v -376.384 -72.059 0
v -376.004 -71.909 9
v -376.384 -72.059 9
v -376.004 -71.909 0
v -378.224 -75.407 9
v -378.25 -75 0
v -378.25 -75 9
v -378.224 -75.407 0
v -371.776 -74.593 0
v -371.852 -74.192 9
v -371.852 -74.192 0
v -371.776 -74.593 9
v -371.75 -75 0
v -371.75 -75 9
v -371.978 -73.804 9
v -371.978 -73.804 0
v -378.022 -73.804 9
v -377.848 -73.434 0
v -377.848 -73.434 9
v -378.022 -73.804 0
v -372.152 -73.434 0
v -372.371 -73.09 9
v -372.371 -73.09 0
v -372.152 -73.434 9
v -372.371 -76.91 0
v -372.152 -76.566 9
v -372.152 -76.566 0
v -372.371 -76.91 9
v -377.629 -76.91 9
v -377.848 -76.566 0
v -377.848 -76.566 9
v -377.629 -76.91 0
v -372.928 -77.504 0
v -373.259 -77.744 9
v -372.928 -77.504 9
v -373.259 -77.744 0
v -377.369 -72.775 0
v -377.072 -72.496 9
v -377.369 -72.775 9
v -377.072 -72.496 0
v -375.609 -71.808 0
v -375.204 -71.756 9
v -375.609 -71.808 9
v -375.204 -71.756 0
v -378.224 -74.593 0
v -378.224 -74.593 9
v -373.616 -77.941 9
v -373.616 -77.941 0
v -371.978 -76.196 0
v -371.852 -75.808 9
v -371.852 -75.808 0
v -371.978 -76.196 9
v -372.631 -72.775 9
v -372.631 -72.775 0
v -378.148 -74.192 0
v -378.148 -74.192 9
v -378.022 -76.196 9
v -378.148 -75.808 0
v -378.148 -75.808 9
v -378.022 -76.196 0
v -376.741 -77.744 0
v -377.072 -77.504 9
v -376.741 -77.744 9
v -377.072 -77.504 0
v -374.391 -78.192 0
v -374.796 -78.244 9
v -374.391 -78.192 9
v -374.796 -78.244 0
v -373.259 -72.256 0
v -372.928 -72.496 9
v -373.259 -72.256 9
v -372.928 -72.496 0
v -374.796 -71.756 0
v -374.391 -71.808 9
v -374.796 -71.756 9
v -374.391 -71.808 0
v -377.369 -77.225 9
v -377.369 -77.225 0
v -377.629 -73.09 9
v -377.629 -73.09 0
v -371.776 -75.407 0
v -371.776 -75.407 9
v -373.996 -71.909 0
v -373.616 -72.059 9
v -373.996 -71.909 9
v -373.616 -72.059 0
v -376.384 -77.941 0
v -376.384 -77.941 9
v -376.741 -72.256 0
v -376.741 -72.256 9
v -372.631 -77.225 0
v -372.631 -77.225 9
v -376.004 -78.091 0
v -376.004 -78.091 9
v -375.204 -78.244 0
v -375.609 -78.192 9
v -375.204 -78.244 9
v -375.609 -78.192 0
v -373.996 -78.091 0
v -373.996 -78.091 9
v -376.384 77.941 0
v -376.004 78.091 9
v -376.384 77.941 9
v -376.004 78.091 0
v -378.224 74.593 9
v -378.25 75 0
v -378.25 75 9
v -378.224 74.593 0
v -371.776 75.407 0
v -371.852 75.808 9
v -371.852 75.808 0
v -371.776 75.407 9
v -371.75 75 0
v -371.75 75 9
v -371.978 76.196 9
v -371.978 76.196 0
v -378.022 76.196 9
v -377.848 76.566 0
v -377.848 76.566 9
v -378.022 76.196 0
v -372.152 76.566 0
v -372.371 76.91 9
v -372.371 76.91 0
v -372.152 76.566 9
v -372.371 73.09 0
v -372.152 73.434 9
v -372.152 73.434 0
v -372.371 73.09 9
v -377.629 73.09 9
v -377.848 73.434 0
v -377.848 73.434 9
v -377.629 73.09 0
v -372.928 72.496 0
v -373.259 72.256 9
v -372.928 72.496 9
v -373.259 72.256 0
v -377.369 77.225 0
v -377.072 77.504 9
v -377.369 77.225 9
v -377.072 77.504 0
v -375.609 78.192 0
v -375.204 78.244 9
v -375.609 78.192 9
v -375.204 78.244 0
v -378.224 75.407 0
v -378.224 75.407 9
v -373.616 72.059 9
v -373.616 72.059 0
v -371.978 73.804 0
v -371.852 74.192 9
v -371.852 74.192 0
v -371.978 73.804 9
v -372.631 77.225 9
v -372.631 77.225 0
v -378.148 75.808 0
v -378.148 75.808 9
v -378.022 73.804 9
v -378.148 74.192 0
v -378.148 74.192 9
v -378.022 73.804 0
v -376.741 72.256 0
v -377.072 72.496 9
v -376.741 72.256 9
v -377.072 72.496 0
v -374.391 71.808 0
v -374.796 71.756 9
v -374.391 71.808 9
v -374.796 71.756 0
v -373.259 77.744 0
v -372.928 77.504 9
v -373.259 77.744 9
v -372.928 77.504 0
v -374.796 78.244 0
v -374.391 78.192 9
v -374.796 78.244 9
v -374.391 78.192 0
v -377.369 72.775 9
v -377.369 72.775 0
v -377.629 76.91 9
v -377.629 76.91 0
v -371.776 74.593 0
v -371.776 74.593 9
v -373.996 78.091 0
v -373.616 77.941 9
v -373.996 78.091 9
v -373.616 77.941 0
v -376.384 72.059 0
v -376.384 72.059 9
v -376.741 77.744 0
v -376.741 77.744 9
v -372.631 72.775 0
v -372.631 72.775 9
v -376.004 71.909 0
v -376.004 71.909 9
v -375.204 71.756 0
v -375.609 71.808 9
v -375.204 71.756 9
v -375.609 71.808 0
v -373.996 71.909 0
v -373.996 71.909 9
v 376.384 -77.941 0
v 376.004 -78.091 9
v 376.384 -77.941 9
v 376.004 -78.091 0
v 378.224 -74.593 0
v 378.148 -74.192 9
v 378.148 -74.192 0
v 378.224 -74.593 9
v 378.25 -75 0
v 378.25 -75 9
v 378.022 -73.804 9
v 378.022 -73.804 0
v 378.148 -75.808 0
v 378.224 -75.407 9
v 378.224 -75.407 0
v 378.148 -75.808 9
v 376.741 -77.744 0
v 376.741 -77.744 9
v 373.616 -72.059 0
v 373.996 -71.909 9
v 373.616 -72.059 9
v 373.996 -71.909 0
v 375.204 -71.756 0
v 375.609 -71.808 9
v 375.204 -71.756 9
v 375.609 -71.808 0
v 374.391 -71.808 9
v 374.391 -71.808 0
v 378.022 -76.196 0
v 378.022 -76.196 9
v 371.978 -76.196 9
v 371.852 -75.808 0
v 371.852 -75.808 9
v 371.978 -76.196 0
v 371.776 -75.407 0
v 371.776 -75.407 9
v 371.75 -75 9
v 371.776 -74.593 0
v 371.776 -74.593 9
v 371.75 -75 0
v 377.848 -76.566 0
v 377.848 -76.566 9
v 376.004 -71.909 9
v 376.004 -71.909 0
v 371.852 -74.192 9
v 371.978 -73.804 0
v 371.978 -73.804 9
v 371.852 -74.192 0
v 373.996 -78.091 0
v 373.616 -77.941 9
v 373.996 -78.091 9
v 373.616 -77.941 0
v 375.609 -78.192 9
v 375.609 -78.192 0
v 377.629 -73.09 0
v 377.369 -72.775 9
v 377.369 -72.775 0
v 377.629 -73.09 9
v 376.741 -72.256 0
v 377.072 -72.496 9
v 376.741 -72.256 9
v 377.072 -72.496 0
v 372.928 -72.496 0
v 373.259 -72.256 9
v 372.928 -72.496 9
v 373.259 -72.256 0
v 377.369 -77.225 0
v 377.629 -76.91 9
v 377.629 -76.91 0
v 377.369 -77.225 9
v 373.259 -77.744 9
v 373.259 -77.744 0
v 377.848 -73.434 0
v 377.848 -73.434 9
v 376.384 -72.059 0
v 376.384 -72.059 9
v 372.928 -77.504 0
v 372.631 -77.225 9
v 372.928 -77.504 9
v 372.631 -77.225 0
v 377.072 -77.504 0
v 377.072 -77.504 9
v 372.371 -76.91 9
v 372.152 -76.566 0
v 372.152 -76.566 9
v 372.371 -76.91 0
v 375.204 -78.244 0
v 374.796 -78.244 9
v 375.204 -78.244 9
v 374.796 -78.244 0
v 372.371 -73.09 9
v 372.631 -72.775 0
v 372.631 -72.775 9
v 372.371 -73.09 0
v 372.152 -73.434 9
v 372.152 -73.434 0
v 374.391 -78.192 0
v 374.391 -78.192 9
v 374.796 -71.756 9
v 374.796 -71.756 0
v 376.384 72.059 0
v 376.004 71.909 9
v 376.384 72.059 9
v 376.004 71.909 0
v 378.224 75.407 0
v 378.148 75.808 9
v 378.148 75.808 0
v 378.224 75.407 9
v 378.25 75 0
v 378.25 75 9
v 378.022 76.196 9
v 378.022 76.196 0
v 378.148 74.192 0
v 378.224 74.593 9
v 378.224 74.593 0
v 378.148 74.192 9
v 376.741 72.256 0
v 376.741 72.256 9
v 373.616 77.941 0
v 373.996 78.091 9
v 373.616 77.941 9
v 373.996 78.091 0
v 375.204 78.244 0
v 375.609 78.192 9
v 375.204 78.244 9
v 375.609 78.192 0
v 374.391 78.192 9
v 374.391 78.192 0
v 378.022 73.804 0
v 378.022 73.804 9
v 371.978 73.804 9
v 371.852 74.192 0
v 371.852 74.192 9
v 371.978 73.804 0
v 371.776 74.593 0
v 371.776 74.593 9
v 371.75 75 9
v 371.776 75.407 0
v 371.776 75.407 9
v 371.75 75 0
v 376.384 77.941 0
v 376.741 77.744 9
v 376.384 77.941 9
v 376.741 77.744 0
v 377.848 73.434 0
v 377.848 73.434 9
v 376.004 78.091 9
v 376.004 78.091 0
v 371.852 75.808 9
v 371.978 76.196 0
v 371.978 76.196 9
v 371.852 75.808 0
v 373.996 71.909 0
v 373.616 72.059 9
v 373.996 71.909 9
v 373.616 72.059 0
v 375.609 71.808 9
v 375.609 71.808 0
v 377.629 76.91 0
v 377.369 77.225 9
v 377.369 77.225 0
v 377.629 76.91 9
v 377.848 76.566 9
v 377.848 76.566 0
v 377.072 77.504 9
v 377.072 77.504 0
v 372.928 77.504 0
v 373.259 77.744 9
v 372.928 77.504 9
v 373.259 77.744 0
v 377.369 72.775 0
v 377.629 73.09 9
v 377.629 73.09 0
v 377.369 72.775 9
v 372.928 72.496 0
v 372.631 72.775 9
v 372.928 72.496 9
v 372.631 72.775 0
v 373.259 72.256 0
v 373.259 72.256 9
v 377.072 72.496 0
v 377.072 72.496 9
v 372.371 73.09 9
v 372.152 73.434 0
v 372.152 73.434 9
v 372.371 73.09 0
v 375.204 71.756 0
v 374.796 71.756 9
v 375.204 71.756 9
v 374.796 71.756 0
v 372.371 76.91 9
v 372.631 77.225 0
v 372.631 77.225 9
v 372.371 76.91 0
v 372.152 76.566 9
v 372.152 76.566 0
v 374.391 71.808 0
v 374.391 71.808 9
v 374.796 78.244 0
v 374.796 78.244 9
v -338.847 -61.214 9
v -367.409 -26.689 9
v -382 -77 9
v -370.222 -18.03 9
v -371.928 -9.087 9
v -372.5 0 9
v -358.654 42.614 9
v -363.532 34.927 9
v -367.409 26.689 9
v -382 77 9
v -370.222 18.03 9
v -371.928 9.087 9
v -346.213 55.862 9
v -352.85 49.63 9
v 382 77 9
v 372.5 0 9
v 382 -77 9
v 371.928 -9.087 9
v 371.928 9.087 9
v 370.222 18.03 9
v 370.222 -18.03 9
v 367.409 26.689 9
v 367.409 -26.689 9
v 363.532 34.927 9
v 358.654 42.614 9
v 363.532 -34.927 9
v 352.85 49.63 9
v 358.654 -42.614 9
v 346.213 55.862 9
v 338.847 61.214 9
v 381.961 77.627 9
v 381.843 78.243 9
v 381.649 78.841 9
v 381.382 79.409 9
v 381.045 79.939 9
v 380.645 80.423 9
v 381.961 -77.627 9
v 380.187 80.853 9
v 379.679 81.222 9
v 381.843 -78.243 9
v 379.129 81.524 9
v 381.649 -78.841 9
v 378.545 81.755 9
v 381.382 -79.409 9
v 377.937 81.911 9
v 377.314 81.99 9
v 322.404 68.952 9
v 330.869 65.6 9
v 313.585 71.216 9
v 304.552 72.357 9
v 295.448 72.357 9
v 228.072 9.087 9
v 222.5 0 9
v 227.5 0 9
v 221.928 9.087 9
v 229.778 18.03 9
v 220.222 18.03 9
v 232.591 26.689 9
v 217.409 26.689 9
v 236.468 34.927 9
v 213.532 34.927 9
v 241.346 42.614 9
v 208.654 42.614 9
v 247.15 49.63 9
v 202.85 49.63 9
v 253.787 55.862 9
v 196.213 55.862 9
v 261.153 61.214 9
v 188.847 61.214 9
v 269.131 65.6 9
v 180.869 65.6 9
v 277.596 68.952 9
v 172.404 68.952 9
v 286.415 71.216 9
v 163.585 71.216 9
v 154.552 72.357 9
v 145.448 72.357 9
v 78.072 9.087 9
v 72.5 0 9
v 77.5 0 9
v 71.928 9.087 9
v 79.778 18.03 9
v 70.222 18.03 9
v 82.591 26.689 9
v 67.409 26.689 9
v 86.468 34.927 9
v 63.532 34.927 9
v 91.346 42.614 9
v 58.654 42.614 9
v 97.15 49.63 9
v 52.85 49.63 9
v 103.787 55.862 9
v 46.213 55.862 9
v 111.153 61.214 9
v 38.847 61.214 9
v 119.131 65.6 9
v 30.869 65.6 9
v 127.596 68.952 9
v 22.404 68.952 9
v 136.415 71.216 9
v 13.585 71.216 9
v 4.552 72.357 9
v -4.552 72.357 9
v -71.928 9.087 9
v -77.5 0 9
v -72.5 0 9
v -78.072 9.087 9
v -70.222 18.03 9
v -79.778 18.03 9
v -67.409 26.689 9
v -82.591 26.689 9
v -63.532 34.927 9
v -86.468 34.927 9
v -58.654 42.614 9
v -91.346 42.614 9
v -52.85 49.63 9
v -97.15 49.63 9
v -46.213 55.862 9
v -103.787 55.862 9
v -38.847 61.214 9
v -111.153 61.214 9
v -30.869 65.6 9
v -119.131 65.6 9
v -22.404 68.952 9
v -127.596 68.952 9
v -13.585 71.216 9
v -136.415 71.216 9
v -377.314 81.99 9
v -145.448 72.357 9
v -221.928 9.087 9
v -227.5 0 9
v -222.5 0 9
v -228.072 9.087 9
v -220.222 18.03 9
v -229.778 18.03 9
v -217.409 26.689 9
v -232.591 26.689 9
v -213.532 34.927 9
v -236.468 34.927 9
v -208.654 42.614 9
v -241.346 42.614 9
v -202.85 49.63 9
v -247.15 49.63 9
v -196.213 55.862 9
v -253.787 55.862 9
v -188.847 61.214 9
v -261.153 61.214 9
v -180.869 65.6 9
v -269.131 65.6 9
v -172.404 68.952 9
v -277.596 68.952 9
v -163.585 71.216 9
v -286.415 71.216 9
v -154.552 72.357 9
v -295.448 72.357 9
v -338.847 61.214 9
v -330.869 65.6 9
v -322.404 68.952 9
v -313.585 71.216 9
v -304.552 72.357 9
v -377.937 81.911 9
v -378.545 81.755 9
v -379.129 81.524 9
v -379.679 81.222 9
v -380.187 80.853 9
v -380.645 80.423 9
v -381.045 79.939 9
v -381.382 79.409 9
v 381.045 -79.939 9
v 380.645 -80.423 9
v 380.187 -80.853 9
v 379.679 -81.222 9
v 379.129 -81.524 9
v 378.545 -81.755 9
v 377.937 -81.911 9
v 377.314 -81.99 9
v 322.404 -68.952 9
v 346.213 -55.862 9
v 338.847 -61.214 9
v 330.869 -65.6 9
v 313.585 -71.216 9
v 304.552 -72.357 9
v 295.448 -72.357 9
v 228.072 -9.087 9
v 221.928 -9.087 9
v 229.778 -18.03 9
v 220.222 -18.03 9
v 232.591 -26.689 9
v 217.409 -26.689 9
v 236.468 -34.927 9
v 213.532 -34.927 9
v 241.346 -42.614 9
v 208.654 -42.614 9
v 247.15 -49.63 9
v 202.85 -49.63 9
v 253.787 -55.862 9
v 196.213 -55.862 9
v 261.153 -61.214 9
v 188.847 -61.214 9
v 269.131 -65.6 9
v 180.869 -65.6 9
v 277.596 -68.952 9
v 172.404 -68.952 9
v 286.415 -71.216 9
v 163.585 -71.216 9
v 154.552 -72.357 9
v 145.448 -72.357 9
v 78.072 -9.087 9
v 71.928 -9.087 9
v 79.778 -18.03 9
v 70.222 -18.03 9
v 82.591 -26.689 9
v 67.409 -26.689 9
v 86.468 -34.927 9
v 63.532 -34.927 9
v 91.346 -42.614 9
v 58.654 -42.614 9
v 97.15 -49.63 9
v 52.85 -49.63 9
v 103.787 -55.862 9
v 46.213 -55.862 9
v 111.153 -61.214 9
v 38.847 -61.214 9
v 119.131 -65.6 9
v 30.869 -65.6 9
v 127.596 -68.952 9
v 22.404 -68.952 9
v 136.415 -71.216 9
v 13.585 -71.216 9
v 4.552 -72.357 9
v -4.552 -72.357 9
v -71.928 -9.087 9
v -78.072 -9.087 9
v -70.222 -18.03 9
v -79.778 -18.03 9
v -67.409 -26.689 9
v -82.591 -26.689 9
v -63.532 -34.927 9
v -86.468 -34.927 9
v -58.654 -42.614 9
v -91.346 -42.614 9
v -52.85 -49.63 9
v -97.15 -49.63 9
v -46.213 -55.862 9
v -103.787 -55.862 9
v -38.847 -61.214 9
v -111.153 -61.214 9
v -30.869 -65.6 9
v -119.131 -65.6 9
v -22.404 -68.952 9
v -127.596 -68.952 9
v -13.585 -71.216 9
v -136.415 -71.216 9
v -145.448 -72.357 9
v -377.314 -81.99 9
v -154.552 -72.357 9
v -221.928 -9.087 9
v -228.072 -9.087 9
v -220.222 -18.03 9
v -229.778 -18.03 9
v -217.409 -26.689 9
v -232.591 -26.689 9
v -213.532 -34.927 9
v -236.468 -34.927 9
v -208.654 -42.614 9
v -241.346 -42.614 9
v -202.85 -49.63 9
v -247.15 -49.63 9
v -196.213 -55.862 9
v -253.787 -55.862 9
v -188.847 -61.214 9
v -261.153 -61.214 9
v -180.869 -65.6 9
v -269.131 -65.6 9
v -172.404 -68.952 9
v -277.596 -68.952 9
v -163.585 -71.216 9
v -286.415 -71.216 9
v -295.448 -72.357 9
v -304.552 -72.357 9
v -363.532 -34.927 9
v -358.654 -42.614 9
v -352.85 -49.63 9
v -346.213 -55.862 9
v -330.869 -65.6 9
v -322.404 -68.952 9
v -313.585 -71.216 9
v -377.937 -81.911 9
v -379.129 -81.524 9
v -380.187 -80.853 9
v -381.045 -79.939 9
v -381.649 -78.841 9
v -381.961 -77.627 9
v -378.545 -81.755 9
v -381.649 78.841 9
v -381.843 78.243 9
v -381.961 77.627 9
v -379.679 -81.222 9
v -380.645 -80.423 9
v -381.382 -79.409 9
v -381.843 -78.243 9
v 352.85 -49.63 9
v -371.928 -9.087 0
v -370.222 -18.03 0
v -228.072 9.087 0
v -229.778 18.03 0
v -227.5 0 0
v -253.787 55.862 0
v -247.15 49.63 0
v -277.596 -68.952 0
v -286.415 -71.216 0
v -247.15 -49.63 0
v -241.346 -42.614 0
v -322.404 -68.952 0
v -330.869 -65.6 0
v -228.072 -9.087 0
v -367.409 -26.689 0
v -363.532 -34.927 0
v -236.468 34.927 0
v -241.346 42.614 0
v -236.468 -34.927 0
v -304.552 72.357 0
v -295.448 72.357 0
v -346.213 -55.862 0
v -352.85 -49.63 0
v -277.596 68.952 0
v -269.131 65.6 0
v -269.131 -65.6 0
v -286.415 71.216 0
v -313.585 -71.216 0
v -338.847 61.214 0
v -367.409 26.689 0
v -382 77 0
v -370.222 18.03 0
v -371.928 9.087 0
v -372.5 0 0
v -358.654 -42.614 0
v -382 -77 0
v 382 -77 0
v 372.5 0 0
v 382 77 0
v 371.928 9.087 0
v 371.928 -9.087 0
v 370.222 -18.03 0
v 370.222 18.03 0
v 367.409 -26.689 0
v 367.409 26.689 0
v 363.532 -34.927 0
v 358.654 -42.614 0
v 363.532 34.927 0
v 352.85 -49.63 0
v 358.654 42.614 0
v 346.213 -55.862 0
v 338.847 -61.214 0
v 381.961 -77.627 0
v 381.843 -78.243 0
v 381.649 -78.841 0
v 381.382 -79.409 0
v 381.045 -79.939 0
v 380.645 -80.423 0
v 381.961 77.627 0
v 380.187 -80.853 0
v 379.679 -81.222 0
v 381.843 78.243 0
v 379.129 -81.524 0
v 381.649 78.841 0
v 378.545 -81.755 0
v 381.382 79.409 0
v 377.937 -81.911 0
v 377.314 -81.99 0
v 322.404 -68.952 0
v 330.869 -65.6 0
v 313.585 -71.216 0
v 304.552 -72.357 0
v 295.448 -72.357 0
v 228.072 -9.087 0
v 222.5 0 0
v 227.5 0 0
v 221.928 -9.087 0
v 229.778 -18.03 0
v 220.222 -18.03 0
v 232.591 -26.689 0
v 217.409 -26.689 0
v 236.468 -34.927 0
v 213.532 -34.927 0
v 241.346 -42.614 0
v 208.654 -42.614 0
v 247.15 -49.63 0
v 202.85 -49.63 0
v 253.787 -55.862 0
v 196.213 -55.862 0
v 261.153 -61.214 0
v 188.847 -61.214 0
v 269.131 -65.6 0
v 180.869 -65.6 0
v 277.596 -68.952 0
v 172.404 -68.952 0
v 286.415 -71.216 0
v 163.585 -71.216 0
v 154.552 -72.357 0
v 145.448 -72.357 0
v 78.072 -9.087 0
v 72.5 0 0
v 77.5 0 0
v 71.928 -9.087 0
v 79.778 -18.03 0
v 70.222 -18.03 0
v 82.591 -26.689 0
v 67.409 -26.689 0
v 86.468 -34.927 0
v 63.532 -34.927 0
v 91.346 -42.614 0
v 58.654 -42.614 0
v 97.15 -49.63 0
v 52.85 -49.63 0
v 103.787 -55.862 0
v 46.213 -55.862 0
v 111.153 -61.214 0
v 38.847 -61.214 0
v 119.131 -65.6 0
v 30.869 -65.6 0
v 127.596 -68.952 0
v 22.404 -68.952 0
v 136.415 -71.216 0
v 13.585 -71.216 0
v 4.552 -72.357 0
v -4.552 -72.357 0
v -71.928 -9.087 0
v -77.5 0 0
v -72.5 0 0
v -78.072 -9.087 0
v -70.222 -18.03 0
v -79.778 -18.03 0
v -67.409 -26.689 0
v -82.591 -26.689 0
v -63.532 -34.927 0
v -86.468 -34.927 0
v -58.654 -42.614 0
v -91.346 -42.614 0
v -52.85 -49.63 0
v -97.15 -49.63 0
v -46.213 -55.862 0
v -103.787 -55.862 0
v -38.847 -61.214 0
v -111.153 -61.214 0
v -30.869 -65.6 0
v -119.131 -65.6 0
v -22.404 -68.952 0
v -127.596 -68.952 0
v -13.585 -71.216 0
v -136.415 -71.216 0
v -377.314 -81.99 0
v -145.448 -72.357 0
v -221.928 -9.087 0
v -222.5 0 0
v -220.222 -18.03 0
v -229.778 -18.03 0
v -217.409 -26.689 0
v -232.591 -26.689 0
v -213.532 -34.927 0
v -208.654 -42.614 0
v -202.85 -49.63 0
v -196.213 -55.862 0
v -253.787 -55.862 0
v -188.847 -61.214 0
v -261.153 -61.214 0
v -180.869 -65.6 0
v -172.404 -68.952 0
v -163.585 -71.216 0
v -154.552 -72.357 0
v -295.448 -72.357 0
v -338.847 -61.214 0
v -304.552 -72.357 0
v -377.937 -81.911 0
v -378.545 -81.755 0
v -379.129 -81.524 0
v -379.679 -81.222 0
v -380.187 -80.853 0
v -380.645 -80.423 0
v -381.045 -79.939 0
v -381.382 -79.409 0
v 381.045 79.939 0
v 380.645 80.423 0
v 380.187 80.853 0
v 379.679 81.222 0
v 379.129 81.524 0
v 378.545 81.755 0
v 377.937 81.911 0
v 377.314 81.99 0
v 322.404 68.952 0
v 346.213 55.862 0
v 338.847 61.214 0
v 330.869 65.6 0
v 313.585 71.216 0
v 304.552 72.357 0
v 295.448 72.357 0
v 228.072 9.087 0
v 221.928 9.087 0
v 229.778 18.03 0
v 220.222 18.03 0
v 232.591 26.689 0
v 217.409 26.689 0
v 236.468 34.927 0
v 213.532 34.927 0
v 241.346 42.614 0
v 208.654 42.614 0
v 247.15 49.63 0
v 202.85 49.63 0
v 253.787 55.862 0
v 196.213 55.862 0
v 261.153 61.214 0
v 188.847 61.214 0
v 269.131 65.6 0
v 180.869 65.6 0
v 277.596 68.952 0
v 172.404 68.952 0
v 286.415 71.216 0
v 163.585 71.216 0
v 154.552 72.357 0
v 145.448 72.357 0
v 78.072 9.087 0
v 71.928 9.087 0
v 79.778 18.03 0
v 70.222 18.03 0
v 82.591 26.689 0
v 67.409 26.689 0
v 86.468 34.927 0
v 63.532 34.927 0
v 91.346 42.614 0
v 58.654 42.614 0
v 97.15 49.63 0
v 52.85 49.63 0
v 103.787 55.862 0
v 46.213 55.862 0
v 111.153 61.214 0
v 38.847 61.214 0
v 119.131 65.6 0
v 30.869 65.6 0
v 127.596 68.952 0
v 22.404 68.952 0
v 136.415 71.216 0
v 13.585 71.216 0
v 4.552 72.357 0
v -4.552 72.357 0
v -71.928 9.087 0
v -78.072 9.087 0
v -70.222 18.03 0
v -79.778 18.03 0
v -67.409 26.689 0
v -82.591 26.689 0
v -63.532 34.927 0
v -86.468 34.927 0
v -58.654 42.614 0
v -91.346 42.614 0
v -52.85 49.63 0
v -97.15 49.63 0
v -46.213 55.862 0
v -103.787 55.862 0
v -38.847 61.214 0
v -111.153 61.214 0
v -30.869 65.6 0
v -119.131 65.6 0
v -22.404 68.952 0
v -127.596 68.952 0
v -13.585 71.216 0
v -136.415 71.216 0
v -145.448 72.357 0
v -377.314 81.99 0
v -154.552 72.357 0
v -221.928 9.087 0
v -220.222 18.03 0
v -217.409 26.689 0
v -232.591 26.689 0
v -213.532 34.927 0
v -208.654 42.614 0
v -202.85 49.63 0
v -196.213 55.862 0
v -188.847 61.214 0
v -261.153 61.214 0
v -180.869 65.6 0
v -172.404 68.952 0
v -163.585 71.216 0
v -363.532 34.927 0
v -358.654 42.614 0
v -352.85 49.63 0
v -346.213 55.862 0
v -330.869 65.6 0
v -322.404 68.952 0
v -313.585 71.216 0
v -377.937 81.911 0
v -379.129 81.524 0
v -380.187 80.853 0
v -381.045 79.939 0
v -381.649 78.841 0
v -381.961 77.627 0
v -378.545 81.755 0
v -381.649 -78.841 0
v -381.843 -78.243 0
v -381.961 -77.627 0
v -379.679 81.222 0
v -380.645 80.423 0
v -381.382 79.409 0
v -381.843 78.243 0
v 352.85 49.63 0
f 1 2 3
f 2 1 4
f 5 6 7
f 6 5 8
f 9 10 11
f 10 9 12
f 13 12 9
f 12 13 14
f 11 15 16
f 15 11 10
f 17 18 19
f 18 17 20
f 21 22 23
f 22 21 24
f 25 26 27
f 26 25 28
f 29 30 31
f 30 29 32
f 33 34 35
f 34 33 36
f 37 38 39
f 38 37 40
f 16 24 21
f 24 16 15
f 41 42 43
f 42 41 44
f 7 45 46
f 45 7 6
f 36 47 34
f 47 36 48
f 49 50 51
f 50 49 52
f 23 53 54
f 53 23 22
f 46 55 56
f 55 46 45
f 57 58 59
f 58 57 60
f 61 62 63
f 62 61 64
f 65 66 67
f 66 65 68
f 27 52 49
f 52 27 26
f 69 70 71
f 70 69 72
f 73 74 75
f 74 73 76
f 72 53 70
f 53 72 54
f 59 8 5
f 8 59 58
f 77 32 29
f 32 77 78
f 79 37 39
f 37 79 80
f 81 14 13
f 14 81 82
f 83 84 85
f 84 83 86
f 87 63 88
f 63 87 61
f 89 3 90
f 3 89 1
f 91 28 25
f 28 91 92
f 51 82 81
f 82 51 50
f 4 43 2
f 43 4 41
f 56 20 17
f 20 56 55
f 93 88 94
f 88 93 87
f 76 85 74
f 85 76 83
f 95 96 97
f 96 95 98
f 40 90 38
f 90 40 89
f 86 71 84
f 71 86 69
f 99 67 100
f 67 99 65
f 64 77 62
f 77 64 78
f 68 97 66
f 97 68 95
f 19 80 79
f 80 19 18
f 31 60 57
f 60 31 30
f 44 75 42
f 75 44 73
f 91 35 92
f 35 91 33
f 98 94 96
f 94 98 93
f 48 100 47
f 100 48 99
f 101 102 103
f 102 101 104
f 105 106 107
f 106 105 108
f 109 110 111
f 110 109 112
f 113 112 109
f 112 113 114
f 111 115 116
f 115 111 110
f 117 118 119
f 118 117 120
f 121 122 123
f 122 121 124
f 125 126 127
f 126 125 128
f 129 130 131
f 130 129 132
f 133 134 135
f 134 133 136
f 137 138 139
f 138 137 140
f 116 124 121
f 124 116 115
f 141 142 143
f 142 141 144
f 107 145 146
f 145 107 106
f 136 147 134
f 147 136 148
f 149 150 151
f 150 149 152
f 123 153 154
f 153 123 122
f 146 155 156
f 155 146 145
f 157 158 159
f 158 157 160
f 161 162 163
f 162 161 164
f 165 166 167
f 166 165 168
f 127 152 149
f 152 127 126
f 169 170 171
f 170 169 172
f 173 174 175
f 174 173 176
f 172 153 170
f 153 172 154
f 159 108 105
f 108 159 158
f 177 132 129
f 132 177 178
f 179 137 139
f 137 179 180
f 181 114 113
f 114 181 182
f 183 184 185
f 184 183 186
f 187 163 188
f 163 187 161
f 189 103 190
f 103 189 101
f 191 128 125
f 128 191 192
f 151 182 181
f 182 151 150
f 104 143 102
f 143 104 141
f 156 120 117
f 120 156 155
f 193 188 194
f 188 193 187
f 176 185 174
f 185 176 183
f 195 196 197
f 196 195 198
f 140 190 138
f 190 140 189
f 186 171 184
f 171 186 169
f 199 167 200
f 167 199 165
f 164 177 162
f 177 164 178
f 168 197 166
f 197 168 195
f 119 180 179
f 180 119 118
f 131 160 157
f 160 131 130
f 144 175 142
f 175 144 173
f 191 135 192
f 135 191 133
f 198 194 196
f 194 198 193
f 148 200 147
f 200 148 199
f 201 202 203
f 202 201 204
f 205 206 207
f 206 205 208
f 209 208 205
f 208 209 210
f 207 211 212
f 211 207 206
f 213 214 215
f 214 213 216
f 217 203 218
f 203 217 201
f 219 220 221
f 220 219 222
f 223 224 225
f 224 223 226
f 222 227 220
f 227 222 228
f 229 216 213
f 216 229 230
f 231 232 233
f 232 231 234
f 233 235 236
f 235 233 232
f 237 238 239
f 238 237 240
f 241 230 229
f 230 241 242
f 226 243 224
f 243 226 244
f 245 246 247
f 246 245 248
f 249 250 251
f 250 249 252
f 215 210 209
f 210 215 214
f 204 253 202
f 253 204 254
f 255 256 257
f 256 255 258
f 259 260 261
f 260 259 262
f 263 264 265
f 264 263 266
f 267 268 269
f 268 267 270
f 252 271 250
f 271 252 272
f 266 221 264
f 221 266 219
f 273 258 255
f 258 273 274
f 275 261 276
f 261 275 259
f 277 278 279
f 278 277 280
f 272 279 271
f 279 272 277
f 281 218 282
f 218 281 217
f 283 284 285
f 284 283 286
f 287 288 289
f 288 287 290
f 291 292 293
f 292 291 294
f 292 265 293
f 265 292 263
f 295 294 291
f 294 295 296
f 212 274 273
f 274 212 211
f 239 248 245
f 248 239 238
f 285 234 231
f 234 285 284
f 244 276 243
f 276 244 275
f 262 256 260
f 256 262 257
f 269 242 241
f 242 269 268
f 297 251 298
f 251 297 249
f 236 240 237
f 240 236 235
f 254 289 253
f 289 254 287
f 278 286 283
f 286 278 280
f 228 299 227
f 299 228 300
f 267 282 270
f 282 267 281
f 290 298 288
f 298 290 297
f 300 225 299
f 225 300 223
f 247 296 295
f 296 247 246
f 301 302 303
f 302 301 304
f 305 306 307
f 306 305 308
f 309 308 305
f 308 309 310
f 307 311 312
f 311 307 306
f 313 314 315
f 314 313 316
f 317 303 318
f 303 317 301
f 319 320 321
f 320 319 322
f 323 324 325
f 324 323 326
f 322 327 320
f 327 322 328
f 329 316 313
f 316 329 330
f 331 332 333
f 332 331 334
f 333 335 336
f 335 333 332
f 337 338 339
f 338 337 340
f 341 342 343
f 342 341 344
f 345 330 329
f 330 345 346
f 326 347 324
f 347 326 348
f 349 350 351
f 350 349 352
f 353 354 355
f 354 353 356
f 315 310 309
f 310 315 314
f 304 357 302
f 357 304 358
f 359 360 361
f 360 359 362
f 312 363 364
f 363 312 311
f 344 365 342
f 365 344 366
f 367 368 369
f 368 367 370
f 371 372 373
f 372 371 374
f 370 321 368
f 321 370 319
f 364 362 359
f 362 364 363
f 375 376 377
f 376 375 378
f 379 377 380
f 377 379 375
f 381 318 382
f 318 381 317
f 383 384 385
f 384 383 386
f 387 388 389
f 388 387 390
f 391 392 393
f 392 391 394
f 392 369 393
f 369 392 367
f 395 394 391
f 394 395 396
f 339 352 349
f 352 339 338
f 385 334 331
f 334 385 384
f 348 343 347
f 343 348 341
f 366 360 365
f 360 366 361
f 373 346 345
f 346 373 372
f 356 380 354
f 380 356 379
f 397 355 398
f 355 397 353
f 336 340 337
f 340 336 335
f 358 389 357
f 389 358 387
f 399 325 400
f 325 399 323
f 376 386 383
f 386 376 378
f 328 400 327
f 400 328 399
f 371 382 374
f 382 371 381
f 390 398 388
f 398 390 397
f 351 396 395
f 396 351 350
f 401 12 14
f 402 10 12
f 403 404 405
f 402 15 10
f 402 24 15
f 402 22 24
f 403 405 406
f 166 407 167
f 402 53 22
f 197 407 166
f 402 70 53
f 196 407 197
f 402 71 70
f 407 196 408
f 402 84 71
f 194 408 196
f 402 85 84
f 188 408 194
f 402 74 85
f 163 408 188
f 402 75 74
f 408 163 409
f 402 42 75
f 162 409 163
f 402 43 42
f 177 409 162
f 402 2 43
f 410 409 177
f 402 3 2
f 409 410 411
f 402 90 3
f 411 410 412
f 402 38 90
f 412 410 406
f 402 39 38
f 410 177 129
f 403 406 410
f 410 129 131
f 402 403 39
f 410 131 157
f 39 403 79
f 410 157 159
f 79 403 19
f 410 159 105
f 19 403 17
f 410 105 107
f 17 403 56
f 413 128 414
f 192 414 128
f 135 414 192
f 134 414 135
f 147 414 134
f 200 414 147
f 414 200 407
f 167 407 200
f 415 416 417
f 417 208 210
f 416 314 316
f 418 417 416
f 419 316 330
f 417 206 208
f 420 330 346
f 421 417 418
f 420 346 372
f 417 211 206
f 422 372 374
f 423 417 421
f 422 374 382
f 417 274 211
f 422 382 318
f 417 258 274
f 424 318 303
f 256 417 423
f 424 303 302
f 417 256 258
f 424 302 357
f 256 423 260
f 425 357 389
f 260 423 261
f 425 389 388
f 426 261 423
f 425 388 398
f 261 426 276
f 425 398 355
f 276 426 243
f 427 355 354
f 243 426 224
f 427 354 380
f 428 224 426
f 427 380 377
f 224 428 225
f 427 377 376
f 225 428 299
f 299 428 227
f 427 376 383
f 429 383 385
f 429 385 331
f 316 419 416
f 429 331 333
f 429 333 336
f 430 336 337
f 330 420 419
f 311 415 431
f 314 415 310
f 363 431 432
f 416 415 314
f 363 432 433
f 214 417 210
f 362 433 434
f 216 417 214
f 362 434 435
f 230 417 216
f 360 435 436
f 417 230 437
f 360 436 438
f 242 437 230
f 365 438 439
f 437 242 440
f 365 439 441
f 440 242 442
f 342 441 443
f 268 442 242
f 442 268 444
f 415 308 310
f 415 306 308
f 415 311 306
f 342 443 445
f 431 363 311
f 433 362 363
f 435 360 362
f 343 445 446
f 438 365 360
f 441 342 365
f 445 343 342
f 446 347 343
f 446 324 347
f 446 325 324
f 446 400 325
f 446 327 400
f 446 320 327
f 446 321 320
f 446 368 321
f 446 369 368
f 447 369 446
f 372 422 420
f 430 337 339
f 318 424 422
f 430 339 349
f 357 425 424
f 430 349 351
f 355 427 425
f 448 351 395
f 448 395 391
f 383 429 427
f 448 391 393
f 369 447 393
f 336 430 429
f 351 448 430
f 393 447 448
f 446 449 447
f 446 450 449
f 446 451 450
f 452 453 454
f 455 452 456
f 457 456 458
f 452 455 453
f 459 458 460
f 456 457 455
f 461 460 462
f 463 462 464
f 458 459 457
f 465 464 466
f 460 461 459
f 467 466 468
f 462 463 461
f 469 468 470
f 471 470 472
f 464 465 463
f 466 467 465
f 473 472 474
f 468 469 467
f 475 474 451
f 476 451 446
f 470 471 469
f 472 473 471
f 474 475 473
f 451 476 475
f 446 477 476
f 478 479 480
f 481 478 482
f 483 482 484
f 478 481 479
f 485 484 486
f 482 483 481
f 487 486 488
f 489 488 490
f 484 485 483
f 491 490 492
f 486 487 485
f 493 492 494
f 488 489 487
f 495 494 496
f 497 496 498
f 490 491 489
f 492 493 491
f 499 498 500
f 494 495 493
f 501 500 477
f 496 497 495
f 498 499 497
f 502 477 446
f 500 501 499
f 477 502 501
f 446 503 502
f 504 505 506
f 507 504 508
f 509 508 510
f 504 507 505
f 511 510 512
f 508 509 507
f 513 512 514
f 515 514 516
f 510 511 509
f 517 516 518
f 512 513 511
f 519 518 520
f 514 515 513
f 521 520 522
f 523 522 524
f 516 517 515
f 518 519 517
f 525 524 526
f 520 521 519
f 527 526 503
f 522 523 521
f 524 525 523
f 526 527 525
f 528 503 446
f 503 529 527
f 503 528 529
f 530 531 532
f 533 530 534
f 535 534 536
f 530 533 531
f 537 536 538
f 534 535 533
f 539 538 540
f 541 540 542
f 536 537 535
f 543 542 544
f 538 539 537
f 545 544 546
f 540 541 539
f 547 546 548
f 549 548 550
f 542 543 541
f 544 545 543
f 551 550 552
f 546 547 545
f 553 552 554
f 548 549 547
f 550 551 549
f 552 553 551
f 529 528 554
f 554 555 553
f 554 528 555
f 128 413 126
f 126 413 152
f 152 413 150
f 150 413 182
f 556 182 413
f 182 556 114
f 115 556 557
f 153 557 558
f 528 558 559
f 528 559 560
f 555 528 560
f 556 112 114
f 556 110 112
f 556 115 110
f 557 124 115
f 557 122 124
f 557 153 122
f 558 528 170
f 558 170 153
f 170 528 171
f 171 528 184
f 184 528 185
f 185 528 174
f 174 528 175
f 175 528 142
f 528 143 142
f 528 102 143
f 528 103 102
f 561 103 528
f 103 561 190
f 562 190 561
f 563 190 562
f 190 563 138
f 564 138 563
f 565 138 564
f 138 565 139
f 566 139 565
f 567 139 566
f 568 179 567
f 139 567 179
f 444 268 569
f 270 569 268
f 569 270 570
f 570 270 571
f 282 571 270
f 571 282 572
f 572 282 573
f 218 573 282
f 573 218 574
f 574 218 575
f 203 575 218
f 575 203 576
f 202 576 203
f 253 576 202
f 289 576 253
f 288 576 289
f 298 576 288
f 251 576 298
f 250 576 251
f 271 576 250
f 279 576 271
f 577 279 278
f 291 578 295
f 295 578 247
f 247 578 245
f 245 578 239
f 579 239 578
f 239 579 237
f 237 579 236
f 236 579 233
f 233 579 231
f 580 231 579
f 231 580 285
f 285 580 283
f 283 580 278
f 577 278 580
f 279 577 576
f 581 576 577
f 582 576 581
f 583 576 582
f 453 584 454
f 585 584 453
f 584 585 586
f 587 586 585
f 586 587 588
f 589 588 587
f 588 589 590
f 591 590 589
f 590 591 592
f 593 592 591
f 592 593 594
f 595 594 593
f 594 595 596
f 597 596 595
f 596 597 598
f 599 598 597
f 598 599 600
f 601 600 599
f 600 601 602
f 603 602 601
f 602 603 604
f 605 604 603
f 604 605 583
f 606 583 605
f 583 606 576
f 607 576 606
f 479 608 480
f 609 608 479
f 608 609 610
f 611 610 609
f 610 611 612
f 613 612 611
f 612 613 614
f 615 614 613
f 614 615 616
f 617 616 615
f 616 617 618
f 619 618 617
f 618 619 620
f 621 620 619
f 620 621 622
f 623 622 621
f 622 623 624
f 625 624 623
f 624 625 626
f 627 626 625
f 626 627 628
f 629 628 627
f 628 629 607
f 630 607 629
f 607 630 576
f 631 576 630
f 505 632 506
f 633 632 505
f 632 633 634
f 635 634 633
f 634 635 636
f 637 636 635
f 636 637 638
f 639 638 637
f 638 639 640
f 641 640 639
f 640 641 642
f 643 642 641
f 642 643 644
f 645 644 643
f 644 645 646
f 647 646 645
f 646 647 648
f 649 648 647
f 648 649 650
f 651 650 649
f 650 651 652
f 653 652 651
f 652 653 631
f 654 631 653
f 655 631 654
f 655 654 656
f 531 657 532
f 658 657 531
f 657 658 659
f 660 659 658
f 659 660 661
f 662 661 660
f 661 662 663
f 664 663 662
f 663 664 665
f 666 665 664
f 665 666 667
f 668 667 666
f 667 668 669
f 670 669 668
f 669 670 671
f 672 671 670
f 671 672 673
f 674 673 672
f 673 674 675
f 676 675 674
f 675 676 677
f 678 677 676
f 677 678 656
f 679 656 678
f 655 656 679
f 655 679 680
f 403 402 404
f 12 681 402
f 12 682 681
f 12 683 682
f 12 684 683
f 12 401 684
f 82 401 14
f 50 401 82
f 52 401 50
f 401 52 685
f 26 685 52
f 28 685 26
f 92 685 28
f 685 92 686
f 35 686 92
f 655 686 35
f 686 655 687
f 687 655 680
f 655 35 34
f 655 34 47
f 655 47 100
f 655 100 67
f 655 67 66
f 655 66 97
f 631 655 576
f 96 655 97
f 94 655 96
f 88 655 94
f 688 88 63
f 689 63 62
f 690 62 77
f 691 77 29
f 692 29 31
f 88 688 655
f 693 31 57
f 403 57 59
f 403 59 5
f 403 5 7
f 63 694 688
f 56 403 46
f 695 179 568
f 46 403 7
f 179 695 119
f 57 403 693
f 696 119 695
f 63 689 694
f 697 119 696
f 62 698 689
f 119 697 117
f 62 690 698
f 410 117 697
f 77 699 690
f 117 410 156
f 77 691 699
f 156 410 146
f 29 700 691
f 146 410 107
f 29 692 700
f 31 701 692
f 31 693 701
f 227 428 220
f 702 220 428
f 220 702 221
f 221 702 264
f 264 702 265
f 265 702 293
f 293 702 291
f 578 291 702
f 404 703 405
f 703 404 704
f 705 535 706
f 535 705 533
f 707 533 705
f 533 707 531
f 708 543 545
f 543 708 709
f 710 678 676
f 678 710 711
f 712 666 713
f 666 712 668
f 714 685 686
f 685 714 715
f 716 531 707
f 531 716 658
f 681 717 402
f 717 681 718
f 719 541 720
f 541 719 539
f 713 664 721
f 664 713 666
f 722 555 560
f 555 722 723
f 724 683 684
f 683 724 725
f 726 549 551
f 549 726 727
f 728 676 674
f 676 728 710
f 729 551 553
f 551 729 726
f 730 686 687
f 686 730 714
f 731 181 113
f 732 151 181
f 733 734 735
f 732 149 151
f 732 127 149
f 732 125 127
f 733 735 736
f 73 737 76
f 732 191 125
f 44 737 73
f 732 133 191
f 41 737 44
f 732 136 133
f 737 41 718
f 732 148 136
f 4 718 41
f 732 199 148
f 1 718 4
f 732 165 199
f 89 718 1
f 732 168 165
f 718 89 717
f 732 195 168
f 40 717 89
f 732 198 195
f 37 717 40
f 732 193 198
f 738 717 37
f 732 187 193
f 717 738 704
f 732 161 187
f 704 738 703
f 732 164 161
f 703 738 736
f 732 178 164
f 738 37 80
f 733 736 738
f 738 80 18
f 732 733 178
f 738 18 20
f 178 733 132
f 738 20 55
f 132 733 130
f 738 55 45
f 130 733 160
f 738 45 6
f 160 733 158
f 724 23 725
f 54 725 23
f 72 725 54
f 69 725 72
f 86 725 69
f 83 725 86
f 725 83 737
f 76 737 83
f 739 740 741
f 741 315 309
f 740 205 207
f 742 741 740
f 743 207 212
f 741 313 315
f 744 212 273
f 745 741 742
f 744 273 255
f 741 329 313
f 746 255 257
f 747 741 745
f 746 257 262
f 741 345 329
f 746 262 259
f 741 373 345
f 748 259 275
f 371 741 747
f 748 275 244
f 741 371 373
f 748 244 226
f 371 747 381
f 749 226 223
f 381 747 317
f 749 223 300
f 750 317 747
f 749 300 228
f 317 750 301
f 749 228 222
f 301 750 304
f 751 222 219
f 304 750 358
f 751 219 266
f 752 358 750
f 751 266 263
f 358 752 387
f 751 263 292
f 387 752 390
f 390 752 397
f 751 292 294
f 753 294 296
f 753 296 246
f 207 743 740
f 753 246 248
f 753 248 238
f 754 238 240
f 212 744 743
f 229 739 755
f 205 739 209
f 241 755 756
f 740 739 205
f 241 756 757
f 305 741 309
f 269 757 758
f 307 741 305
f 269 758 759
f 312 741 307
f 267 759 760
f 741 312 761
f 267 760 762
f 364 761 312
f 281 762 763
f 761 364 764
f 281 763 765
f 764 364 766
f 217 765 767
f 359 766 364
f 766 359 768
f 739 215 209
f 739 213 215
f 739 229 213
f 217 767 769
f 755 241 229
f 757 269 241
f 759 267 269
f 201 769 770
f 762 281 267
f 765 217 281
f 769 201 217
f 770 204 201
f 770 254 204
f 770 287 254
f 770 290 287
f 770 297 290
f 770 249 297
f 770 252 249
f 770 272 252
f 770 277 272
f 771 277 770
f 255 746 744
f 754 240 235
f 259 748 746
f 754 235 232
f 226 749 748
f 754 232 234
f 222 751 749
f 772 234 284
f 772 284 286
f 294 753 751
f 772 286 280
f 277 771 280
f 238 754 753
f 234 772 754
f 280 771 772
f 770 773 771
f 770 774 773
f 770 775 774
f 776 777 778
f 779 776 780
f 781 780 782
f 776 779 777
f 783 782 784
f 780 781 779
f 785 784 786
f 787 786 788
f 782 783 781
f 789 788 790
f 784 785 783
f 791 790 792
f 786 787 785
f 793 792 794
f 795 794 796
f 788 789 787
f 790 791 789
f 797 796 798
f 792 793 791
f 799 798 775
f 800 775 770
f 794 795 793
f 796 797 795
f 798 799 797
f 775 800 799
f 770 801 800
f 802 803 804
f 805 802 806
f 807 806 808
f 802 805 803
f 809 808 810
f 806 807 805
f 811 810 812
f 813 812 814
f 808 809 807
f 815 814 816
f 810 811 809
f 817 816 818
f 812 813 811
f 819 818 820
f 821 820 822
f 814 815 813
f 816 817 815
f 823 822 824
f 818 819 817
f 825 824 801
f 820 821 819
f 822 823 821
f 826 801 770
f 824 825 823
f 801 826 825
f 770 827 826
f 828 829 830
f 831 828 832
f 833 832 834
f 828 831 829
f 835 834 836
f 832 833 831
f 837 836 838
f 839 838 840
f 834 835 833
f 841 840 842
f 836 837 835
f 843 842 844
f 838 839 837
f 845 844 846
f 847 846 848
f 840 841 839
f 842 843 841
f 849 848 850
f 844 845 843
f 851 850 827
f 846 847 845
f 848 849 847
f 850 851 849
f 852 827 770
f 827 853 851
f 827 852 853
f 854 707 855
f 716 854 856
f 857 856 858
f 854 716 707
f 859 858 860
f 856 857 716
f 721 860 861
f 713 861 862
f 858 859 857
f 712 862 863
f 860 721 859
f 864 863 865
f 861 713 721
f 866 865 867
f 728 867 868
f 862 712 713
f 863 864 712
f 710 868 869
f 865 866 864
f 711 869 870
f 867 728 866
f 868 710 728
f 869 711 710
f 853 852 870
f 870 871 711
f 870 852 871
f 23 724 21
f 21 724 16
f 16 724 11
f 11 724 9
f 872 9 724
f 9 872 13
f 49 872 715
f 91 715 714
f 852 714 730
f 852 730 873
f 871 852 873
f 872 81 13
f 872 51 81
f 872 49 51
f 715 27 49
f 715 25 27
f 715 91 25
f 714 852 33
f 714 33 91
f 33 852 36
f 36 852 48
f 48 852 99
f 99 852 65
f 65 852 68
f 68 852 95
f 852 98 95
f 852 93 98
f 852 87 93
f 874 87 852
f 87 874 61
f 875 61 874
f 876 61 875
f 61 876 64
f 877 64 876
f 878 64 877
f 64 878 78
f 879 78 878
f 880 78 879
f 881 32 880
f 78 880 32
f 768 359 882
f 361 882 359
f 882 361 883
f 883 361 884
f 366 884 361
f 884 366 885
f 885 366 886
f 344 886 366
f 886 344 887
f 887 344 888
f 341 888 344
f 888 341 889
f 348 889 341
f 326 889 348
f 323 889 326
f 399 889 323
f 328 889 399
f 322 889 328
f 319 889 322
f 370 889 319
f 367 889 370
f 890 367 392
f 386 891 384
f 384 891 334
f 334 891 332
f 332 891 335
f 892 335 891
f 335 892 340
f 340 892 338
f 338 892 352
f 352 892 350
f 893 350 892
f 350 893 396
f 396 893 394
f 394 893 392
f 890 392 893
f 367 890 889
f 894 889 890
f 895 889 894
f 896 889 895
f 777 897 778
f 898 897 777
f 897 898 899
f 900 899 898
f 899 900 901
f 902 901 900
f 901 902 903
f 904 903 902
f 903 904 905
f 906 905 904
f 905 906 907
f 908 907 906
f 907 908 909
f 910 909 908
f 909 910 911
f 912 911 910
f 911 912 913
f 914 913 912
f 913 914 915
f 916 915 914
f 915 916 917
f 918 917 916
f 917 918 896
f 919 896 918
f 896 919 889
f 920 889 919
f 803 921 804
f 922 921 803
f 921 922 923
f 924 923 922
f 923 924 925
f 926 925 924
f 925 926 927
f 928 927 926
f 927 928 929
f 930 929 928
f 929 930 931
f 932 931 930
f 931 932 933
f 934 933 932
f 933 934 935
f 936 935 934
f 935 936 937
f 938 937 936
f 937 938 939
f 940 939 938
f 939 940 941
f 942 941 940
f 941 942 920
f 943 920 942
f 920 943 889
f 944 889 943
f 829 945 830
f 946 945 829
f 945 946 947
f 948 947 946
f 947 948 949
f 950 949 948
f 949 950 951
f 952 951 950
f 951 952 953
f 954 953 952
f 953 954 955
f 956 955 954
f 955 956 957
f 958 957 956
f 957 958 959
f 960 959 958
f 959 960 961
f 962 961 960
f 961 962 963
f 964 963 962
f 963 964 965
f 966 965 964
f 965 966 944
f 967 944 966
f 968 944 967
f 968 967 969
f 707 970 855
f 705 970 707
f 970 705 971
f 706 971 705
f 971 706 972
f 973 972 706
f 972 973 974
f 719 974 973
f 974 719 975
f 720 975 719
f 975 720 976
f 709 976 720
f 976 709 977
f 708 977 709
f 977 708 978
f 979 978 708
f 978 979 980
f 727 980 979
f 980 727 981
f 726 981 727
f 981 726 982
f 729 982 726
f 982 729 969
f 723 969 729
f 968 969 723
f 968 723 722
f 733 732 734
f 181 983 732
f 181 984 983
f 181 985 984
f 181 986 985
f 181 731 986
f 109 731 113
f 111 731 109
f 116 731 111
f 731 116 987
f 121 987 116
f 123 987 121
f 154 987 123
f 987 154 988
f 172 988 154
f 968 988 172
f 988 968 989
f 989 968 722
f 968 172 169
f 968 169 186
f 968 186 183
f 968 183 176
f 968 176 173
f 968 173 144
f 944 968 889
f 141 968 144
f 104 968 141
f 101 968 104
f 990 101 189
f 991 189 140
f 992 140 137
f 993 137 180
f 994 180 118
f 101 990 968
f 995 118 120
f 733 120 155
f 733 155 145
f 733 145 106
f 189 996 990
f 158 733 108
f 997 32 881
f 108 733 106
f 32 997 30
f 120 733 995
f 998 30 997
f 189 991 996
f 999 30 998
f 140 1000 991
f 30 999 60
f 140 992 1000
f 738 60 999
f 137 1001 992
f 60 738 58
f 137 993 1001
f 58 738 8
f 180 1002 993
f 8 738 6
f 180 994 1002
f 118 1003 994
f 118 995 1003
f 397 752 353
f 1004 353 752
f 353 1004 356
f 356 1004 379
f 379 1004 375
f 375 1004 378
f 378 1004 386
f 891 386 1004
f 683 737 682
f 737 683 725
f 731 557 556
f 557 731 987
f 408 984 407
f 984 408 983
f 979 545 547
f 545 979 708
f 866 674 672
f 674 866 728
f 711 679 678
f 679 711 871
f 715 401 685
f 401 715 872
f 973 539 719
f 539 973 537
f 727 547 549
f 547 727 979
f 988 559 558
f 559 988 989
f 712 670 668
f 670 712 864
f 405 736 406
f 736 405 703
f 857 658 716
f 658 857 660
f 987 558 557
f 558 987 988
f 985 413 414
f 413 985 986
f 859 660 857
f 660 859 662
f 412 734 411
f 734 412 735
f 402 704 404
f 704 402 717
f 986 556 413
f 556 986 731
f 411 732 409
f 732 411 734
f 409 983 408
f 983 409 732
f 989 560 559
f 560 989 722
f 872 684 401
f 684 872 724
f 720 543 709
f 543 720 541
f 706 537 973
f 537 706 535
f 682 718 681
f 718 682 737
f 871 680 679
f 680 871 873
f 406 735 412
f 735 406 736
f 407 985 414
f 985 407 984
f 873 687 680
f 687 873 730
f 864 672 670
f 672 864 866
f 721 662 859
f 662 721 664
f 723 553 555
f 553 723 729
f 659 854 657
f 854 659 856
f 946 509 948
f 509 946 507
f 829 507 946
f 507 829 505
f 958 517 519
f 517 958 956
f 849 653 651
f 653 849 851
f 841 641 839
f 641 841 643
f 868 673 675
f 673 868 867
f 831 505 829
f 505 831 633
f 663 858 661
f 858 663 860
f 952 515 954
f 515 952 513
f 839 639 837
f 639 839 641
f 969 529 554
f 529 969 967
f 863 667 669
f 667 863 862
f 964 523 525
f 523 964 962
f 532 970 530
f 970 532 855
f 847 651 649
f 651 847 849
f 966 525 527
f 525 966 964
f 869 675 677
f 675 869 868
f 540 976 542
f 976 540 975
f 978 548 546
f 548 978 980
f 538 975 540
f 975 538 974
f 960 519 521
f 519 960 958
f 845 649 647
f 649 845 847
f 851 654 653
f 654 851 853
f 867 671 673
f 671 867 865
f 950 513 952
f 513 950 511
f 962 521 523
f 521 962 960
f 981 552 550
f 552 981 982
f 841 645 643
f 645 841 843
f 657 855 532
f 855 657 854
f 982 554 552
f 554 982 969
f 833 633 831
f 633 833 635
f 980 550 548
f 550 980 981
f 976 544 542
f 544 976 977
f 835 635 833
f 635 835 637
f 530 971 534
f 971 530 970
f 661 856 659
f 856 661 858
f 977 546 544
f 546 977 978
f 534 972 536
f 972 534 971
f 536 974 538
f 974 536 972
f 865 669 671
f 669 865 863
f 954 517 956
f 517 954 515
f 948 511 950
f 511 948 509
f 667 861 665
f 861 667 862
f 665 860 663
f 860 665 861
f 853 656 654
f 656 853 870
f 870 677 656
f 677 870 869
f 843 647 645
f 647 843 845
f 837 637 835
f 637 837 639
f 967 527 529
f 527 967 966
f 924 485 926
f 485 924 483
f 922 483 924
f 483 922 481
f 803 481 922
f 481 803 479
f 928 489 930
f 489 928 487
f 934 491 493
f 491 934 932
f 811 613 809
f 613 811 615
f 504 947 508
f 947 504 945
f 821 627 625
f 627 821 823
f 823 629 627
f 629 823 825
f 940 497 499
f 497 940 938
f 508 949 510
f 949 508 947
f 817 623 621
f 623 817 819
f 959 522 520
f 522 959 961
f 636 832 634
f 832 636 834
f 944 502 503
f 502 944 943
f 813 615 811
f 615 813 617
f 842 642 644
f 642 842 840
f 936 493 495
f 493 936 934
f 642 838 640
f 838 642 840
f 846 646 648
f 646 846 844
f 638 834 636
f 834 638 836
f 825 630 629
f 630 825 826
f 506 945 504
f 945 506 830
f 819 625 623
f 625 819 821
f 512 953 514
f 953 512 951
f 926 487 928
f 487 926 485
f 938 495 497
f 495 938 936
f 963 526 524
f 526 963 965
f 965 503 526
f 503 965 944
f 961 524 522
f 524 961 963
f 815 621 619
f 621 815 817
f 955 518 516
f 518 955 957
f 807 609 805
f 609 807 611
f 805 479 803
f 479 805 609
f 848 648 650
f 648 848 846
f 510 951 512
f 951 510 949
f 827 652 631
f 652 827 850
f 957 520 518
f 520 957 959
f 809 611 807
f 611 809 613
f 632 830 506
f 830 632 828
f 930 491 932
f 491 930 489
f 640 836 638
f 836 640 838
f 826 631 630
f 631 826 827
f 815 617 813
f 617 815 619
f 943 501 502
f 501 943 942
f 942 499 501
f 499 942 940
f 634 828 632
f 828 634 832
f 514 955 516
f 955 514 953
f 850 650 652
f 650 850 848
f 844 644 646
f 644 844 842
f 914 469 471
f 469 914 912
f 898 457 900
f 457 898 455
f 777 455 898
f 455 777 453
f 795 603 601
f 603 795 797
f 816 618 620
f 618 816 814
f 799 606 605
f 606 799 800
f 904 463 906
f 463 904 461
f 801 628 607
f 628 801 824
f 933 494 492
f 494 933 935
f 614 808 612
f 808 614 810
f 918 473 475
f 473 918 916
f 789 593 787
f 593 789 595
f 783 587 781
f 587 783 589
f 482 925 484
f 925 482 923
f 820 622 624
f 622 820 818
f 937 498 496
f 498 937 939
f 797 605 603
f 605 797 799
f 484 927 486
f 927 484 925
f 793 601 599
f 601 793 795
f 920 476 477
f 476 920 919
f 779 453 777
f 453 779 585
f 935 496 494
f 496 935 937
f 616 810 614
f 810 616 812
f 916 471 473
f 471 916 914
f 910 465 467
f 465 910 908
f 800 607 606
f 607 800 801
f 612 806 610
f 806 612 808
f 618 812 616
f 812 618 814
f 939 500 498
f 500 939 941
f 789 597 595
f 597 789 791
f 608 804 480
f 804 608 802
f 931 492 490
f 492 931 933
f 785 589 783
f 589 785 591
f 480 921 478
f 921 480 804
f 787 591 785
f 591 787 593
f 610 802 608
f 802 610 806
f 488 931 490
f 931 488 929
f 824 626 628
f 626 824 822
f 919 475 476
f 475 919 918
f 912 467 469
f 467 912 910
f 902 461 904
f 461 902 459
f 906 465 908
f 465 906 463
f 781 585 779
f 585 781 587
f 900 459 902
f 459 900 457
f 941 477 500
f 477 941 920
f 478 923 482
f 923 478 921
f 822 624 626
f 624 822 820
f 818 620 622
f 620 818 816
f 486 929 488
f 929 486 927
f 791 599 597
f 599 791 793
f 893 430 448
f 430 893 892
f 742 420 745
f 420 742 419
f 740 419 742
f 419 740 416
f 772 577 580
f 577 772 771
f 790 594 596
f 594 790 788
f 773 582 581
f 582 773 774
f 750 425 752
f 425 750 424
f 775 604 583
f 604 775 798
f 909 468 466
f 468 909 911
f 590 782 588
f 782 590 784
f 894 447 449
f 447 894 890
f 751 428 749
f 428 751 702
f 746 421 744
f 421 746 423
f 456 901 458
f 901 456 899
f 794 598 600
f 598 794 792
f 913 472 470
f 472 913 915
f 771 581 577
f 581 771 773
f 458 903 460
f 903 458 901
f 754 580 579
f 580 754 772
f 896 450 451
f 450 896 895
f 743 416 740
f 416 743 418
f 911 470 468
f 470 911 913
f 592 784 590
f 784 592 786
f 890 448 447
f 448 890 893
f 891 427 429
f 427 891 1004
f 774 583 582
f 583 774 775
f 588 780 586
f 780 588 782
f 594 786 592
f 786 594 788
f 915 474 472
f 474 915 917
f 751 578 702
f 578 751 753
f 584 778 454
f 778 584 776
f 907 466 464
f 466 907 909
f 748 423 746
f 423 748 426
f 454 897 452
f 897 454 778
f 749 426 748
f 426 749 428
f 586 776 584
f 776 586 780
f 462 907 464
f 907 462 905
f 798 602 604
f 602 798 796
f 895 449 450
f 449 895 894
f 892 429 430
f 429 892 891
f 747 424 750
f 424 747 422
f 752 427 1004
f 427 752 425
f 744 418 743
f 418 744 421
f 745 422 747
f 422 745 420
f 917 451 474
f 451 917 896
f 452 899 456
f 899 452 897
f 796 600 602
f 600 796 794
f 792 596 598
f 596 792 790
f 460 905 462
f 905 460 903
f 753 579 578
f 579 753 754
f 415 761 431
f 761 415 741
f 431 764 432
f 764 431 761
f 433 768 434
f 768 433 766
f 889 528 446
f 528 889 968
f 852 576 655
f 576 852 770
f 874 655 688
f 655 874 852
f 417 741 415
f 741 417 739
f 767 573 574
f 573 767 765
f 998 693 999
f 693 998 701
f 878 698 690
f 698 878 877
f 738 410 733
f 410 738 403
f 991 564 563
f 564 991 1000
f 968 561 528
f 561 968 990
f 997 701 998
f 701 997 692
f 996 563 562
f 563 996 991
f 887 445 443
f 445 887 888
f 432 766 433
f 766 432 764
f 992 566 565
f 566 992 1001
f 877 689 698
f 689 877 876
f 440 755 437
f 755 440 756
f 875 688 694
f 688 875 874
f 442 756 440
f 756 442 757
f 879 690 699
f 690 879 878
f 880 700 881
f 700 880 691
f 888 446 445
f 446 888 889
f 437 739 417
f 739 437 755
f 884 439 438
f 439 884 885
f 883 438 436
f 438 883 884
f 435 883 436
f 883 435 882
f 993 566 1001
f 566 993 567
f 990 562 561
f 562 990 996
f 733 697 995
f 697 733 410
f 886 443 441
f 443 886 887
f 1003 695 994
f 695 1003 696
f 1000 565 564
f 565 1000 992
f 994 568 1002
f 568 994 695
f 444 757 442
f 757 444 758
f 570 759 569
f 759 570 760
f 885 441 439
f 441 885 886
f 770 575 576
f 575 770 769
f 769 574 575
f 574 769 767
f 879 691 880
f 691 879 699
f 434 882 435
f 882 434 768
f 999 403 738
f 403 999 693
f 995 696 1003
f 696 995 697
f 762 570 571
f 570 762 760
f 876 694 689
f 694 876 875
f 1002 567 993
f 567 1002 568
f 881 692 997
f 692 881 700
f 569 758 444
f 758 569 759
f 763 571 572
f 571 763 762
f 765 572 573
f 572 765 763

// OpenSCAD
$fn = 50;


difference() {
	union() {
		hull() {
			translate(v = [-377.0000000000, 77.0000000000, 0]) {
				cylinder(h = 9, r = 5);
			}
			translate(v = [377.0000000000, 77.0000000000, 0]) {
				cylinder(h = 9, r = 5);
			}
			translate(v = [-377.0000000000, -77.0000000000, 0]) {
				cylinder(h = 9, r = 5);
			}
			translate(v = [377.0000000000, -77.0000000000, 0]) {
				cylinder(h = 9, r = 5);
			}
		}
	}
	union() {
		#translate(v = [-375.0000000000, -75.0000000000, -100.0000000000]) {
			cylinder(h = 200, r = 3.2500000000);
		}
		#translate(v = [-375.0000000000, 75.0000000000, -100.0000000000]) {
			cylinder(h = 200, r = 3.2500000000);
		}
		#translate(v = [375.0000000000, -75.0000000000, -100.0000000000]) {
			cylinder(h = 200, r = 3.2500000000);
		}
		#translate(v = [375.0000000000, 75.0000000000, -100.0000000000]) {
			cylinder(h = 200, r = 3.2500000000);
		}
		#translate(v = [-300.0000000000, 0, 0]) {
			cylinder(h = 9, r = 72.5000000000);
		}
		#translate(v = [-150.0000000000, 0, 0]) {
			cylinder(h = 9, r = 72.5000000000);
		}
		#cylinder(h = 9, r = 72.5000000000);
		#translate(v = [150.0000000000, 0, 0]) {
			cylinder(h = 9, r = 72.5000000000);
		}
		#translate(v = [300.0000000000, 0, 0]) {
			cylinder(h = 9, r = 72.5000000000);
		}
	}
}
